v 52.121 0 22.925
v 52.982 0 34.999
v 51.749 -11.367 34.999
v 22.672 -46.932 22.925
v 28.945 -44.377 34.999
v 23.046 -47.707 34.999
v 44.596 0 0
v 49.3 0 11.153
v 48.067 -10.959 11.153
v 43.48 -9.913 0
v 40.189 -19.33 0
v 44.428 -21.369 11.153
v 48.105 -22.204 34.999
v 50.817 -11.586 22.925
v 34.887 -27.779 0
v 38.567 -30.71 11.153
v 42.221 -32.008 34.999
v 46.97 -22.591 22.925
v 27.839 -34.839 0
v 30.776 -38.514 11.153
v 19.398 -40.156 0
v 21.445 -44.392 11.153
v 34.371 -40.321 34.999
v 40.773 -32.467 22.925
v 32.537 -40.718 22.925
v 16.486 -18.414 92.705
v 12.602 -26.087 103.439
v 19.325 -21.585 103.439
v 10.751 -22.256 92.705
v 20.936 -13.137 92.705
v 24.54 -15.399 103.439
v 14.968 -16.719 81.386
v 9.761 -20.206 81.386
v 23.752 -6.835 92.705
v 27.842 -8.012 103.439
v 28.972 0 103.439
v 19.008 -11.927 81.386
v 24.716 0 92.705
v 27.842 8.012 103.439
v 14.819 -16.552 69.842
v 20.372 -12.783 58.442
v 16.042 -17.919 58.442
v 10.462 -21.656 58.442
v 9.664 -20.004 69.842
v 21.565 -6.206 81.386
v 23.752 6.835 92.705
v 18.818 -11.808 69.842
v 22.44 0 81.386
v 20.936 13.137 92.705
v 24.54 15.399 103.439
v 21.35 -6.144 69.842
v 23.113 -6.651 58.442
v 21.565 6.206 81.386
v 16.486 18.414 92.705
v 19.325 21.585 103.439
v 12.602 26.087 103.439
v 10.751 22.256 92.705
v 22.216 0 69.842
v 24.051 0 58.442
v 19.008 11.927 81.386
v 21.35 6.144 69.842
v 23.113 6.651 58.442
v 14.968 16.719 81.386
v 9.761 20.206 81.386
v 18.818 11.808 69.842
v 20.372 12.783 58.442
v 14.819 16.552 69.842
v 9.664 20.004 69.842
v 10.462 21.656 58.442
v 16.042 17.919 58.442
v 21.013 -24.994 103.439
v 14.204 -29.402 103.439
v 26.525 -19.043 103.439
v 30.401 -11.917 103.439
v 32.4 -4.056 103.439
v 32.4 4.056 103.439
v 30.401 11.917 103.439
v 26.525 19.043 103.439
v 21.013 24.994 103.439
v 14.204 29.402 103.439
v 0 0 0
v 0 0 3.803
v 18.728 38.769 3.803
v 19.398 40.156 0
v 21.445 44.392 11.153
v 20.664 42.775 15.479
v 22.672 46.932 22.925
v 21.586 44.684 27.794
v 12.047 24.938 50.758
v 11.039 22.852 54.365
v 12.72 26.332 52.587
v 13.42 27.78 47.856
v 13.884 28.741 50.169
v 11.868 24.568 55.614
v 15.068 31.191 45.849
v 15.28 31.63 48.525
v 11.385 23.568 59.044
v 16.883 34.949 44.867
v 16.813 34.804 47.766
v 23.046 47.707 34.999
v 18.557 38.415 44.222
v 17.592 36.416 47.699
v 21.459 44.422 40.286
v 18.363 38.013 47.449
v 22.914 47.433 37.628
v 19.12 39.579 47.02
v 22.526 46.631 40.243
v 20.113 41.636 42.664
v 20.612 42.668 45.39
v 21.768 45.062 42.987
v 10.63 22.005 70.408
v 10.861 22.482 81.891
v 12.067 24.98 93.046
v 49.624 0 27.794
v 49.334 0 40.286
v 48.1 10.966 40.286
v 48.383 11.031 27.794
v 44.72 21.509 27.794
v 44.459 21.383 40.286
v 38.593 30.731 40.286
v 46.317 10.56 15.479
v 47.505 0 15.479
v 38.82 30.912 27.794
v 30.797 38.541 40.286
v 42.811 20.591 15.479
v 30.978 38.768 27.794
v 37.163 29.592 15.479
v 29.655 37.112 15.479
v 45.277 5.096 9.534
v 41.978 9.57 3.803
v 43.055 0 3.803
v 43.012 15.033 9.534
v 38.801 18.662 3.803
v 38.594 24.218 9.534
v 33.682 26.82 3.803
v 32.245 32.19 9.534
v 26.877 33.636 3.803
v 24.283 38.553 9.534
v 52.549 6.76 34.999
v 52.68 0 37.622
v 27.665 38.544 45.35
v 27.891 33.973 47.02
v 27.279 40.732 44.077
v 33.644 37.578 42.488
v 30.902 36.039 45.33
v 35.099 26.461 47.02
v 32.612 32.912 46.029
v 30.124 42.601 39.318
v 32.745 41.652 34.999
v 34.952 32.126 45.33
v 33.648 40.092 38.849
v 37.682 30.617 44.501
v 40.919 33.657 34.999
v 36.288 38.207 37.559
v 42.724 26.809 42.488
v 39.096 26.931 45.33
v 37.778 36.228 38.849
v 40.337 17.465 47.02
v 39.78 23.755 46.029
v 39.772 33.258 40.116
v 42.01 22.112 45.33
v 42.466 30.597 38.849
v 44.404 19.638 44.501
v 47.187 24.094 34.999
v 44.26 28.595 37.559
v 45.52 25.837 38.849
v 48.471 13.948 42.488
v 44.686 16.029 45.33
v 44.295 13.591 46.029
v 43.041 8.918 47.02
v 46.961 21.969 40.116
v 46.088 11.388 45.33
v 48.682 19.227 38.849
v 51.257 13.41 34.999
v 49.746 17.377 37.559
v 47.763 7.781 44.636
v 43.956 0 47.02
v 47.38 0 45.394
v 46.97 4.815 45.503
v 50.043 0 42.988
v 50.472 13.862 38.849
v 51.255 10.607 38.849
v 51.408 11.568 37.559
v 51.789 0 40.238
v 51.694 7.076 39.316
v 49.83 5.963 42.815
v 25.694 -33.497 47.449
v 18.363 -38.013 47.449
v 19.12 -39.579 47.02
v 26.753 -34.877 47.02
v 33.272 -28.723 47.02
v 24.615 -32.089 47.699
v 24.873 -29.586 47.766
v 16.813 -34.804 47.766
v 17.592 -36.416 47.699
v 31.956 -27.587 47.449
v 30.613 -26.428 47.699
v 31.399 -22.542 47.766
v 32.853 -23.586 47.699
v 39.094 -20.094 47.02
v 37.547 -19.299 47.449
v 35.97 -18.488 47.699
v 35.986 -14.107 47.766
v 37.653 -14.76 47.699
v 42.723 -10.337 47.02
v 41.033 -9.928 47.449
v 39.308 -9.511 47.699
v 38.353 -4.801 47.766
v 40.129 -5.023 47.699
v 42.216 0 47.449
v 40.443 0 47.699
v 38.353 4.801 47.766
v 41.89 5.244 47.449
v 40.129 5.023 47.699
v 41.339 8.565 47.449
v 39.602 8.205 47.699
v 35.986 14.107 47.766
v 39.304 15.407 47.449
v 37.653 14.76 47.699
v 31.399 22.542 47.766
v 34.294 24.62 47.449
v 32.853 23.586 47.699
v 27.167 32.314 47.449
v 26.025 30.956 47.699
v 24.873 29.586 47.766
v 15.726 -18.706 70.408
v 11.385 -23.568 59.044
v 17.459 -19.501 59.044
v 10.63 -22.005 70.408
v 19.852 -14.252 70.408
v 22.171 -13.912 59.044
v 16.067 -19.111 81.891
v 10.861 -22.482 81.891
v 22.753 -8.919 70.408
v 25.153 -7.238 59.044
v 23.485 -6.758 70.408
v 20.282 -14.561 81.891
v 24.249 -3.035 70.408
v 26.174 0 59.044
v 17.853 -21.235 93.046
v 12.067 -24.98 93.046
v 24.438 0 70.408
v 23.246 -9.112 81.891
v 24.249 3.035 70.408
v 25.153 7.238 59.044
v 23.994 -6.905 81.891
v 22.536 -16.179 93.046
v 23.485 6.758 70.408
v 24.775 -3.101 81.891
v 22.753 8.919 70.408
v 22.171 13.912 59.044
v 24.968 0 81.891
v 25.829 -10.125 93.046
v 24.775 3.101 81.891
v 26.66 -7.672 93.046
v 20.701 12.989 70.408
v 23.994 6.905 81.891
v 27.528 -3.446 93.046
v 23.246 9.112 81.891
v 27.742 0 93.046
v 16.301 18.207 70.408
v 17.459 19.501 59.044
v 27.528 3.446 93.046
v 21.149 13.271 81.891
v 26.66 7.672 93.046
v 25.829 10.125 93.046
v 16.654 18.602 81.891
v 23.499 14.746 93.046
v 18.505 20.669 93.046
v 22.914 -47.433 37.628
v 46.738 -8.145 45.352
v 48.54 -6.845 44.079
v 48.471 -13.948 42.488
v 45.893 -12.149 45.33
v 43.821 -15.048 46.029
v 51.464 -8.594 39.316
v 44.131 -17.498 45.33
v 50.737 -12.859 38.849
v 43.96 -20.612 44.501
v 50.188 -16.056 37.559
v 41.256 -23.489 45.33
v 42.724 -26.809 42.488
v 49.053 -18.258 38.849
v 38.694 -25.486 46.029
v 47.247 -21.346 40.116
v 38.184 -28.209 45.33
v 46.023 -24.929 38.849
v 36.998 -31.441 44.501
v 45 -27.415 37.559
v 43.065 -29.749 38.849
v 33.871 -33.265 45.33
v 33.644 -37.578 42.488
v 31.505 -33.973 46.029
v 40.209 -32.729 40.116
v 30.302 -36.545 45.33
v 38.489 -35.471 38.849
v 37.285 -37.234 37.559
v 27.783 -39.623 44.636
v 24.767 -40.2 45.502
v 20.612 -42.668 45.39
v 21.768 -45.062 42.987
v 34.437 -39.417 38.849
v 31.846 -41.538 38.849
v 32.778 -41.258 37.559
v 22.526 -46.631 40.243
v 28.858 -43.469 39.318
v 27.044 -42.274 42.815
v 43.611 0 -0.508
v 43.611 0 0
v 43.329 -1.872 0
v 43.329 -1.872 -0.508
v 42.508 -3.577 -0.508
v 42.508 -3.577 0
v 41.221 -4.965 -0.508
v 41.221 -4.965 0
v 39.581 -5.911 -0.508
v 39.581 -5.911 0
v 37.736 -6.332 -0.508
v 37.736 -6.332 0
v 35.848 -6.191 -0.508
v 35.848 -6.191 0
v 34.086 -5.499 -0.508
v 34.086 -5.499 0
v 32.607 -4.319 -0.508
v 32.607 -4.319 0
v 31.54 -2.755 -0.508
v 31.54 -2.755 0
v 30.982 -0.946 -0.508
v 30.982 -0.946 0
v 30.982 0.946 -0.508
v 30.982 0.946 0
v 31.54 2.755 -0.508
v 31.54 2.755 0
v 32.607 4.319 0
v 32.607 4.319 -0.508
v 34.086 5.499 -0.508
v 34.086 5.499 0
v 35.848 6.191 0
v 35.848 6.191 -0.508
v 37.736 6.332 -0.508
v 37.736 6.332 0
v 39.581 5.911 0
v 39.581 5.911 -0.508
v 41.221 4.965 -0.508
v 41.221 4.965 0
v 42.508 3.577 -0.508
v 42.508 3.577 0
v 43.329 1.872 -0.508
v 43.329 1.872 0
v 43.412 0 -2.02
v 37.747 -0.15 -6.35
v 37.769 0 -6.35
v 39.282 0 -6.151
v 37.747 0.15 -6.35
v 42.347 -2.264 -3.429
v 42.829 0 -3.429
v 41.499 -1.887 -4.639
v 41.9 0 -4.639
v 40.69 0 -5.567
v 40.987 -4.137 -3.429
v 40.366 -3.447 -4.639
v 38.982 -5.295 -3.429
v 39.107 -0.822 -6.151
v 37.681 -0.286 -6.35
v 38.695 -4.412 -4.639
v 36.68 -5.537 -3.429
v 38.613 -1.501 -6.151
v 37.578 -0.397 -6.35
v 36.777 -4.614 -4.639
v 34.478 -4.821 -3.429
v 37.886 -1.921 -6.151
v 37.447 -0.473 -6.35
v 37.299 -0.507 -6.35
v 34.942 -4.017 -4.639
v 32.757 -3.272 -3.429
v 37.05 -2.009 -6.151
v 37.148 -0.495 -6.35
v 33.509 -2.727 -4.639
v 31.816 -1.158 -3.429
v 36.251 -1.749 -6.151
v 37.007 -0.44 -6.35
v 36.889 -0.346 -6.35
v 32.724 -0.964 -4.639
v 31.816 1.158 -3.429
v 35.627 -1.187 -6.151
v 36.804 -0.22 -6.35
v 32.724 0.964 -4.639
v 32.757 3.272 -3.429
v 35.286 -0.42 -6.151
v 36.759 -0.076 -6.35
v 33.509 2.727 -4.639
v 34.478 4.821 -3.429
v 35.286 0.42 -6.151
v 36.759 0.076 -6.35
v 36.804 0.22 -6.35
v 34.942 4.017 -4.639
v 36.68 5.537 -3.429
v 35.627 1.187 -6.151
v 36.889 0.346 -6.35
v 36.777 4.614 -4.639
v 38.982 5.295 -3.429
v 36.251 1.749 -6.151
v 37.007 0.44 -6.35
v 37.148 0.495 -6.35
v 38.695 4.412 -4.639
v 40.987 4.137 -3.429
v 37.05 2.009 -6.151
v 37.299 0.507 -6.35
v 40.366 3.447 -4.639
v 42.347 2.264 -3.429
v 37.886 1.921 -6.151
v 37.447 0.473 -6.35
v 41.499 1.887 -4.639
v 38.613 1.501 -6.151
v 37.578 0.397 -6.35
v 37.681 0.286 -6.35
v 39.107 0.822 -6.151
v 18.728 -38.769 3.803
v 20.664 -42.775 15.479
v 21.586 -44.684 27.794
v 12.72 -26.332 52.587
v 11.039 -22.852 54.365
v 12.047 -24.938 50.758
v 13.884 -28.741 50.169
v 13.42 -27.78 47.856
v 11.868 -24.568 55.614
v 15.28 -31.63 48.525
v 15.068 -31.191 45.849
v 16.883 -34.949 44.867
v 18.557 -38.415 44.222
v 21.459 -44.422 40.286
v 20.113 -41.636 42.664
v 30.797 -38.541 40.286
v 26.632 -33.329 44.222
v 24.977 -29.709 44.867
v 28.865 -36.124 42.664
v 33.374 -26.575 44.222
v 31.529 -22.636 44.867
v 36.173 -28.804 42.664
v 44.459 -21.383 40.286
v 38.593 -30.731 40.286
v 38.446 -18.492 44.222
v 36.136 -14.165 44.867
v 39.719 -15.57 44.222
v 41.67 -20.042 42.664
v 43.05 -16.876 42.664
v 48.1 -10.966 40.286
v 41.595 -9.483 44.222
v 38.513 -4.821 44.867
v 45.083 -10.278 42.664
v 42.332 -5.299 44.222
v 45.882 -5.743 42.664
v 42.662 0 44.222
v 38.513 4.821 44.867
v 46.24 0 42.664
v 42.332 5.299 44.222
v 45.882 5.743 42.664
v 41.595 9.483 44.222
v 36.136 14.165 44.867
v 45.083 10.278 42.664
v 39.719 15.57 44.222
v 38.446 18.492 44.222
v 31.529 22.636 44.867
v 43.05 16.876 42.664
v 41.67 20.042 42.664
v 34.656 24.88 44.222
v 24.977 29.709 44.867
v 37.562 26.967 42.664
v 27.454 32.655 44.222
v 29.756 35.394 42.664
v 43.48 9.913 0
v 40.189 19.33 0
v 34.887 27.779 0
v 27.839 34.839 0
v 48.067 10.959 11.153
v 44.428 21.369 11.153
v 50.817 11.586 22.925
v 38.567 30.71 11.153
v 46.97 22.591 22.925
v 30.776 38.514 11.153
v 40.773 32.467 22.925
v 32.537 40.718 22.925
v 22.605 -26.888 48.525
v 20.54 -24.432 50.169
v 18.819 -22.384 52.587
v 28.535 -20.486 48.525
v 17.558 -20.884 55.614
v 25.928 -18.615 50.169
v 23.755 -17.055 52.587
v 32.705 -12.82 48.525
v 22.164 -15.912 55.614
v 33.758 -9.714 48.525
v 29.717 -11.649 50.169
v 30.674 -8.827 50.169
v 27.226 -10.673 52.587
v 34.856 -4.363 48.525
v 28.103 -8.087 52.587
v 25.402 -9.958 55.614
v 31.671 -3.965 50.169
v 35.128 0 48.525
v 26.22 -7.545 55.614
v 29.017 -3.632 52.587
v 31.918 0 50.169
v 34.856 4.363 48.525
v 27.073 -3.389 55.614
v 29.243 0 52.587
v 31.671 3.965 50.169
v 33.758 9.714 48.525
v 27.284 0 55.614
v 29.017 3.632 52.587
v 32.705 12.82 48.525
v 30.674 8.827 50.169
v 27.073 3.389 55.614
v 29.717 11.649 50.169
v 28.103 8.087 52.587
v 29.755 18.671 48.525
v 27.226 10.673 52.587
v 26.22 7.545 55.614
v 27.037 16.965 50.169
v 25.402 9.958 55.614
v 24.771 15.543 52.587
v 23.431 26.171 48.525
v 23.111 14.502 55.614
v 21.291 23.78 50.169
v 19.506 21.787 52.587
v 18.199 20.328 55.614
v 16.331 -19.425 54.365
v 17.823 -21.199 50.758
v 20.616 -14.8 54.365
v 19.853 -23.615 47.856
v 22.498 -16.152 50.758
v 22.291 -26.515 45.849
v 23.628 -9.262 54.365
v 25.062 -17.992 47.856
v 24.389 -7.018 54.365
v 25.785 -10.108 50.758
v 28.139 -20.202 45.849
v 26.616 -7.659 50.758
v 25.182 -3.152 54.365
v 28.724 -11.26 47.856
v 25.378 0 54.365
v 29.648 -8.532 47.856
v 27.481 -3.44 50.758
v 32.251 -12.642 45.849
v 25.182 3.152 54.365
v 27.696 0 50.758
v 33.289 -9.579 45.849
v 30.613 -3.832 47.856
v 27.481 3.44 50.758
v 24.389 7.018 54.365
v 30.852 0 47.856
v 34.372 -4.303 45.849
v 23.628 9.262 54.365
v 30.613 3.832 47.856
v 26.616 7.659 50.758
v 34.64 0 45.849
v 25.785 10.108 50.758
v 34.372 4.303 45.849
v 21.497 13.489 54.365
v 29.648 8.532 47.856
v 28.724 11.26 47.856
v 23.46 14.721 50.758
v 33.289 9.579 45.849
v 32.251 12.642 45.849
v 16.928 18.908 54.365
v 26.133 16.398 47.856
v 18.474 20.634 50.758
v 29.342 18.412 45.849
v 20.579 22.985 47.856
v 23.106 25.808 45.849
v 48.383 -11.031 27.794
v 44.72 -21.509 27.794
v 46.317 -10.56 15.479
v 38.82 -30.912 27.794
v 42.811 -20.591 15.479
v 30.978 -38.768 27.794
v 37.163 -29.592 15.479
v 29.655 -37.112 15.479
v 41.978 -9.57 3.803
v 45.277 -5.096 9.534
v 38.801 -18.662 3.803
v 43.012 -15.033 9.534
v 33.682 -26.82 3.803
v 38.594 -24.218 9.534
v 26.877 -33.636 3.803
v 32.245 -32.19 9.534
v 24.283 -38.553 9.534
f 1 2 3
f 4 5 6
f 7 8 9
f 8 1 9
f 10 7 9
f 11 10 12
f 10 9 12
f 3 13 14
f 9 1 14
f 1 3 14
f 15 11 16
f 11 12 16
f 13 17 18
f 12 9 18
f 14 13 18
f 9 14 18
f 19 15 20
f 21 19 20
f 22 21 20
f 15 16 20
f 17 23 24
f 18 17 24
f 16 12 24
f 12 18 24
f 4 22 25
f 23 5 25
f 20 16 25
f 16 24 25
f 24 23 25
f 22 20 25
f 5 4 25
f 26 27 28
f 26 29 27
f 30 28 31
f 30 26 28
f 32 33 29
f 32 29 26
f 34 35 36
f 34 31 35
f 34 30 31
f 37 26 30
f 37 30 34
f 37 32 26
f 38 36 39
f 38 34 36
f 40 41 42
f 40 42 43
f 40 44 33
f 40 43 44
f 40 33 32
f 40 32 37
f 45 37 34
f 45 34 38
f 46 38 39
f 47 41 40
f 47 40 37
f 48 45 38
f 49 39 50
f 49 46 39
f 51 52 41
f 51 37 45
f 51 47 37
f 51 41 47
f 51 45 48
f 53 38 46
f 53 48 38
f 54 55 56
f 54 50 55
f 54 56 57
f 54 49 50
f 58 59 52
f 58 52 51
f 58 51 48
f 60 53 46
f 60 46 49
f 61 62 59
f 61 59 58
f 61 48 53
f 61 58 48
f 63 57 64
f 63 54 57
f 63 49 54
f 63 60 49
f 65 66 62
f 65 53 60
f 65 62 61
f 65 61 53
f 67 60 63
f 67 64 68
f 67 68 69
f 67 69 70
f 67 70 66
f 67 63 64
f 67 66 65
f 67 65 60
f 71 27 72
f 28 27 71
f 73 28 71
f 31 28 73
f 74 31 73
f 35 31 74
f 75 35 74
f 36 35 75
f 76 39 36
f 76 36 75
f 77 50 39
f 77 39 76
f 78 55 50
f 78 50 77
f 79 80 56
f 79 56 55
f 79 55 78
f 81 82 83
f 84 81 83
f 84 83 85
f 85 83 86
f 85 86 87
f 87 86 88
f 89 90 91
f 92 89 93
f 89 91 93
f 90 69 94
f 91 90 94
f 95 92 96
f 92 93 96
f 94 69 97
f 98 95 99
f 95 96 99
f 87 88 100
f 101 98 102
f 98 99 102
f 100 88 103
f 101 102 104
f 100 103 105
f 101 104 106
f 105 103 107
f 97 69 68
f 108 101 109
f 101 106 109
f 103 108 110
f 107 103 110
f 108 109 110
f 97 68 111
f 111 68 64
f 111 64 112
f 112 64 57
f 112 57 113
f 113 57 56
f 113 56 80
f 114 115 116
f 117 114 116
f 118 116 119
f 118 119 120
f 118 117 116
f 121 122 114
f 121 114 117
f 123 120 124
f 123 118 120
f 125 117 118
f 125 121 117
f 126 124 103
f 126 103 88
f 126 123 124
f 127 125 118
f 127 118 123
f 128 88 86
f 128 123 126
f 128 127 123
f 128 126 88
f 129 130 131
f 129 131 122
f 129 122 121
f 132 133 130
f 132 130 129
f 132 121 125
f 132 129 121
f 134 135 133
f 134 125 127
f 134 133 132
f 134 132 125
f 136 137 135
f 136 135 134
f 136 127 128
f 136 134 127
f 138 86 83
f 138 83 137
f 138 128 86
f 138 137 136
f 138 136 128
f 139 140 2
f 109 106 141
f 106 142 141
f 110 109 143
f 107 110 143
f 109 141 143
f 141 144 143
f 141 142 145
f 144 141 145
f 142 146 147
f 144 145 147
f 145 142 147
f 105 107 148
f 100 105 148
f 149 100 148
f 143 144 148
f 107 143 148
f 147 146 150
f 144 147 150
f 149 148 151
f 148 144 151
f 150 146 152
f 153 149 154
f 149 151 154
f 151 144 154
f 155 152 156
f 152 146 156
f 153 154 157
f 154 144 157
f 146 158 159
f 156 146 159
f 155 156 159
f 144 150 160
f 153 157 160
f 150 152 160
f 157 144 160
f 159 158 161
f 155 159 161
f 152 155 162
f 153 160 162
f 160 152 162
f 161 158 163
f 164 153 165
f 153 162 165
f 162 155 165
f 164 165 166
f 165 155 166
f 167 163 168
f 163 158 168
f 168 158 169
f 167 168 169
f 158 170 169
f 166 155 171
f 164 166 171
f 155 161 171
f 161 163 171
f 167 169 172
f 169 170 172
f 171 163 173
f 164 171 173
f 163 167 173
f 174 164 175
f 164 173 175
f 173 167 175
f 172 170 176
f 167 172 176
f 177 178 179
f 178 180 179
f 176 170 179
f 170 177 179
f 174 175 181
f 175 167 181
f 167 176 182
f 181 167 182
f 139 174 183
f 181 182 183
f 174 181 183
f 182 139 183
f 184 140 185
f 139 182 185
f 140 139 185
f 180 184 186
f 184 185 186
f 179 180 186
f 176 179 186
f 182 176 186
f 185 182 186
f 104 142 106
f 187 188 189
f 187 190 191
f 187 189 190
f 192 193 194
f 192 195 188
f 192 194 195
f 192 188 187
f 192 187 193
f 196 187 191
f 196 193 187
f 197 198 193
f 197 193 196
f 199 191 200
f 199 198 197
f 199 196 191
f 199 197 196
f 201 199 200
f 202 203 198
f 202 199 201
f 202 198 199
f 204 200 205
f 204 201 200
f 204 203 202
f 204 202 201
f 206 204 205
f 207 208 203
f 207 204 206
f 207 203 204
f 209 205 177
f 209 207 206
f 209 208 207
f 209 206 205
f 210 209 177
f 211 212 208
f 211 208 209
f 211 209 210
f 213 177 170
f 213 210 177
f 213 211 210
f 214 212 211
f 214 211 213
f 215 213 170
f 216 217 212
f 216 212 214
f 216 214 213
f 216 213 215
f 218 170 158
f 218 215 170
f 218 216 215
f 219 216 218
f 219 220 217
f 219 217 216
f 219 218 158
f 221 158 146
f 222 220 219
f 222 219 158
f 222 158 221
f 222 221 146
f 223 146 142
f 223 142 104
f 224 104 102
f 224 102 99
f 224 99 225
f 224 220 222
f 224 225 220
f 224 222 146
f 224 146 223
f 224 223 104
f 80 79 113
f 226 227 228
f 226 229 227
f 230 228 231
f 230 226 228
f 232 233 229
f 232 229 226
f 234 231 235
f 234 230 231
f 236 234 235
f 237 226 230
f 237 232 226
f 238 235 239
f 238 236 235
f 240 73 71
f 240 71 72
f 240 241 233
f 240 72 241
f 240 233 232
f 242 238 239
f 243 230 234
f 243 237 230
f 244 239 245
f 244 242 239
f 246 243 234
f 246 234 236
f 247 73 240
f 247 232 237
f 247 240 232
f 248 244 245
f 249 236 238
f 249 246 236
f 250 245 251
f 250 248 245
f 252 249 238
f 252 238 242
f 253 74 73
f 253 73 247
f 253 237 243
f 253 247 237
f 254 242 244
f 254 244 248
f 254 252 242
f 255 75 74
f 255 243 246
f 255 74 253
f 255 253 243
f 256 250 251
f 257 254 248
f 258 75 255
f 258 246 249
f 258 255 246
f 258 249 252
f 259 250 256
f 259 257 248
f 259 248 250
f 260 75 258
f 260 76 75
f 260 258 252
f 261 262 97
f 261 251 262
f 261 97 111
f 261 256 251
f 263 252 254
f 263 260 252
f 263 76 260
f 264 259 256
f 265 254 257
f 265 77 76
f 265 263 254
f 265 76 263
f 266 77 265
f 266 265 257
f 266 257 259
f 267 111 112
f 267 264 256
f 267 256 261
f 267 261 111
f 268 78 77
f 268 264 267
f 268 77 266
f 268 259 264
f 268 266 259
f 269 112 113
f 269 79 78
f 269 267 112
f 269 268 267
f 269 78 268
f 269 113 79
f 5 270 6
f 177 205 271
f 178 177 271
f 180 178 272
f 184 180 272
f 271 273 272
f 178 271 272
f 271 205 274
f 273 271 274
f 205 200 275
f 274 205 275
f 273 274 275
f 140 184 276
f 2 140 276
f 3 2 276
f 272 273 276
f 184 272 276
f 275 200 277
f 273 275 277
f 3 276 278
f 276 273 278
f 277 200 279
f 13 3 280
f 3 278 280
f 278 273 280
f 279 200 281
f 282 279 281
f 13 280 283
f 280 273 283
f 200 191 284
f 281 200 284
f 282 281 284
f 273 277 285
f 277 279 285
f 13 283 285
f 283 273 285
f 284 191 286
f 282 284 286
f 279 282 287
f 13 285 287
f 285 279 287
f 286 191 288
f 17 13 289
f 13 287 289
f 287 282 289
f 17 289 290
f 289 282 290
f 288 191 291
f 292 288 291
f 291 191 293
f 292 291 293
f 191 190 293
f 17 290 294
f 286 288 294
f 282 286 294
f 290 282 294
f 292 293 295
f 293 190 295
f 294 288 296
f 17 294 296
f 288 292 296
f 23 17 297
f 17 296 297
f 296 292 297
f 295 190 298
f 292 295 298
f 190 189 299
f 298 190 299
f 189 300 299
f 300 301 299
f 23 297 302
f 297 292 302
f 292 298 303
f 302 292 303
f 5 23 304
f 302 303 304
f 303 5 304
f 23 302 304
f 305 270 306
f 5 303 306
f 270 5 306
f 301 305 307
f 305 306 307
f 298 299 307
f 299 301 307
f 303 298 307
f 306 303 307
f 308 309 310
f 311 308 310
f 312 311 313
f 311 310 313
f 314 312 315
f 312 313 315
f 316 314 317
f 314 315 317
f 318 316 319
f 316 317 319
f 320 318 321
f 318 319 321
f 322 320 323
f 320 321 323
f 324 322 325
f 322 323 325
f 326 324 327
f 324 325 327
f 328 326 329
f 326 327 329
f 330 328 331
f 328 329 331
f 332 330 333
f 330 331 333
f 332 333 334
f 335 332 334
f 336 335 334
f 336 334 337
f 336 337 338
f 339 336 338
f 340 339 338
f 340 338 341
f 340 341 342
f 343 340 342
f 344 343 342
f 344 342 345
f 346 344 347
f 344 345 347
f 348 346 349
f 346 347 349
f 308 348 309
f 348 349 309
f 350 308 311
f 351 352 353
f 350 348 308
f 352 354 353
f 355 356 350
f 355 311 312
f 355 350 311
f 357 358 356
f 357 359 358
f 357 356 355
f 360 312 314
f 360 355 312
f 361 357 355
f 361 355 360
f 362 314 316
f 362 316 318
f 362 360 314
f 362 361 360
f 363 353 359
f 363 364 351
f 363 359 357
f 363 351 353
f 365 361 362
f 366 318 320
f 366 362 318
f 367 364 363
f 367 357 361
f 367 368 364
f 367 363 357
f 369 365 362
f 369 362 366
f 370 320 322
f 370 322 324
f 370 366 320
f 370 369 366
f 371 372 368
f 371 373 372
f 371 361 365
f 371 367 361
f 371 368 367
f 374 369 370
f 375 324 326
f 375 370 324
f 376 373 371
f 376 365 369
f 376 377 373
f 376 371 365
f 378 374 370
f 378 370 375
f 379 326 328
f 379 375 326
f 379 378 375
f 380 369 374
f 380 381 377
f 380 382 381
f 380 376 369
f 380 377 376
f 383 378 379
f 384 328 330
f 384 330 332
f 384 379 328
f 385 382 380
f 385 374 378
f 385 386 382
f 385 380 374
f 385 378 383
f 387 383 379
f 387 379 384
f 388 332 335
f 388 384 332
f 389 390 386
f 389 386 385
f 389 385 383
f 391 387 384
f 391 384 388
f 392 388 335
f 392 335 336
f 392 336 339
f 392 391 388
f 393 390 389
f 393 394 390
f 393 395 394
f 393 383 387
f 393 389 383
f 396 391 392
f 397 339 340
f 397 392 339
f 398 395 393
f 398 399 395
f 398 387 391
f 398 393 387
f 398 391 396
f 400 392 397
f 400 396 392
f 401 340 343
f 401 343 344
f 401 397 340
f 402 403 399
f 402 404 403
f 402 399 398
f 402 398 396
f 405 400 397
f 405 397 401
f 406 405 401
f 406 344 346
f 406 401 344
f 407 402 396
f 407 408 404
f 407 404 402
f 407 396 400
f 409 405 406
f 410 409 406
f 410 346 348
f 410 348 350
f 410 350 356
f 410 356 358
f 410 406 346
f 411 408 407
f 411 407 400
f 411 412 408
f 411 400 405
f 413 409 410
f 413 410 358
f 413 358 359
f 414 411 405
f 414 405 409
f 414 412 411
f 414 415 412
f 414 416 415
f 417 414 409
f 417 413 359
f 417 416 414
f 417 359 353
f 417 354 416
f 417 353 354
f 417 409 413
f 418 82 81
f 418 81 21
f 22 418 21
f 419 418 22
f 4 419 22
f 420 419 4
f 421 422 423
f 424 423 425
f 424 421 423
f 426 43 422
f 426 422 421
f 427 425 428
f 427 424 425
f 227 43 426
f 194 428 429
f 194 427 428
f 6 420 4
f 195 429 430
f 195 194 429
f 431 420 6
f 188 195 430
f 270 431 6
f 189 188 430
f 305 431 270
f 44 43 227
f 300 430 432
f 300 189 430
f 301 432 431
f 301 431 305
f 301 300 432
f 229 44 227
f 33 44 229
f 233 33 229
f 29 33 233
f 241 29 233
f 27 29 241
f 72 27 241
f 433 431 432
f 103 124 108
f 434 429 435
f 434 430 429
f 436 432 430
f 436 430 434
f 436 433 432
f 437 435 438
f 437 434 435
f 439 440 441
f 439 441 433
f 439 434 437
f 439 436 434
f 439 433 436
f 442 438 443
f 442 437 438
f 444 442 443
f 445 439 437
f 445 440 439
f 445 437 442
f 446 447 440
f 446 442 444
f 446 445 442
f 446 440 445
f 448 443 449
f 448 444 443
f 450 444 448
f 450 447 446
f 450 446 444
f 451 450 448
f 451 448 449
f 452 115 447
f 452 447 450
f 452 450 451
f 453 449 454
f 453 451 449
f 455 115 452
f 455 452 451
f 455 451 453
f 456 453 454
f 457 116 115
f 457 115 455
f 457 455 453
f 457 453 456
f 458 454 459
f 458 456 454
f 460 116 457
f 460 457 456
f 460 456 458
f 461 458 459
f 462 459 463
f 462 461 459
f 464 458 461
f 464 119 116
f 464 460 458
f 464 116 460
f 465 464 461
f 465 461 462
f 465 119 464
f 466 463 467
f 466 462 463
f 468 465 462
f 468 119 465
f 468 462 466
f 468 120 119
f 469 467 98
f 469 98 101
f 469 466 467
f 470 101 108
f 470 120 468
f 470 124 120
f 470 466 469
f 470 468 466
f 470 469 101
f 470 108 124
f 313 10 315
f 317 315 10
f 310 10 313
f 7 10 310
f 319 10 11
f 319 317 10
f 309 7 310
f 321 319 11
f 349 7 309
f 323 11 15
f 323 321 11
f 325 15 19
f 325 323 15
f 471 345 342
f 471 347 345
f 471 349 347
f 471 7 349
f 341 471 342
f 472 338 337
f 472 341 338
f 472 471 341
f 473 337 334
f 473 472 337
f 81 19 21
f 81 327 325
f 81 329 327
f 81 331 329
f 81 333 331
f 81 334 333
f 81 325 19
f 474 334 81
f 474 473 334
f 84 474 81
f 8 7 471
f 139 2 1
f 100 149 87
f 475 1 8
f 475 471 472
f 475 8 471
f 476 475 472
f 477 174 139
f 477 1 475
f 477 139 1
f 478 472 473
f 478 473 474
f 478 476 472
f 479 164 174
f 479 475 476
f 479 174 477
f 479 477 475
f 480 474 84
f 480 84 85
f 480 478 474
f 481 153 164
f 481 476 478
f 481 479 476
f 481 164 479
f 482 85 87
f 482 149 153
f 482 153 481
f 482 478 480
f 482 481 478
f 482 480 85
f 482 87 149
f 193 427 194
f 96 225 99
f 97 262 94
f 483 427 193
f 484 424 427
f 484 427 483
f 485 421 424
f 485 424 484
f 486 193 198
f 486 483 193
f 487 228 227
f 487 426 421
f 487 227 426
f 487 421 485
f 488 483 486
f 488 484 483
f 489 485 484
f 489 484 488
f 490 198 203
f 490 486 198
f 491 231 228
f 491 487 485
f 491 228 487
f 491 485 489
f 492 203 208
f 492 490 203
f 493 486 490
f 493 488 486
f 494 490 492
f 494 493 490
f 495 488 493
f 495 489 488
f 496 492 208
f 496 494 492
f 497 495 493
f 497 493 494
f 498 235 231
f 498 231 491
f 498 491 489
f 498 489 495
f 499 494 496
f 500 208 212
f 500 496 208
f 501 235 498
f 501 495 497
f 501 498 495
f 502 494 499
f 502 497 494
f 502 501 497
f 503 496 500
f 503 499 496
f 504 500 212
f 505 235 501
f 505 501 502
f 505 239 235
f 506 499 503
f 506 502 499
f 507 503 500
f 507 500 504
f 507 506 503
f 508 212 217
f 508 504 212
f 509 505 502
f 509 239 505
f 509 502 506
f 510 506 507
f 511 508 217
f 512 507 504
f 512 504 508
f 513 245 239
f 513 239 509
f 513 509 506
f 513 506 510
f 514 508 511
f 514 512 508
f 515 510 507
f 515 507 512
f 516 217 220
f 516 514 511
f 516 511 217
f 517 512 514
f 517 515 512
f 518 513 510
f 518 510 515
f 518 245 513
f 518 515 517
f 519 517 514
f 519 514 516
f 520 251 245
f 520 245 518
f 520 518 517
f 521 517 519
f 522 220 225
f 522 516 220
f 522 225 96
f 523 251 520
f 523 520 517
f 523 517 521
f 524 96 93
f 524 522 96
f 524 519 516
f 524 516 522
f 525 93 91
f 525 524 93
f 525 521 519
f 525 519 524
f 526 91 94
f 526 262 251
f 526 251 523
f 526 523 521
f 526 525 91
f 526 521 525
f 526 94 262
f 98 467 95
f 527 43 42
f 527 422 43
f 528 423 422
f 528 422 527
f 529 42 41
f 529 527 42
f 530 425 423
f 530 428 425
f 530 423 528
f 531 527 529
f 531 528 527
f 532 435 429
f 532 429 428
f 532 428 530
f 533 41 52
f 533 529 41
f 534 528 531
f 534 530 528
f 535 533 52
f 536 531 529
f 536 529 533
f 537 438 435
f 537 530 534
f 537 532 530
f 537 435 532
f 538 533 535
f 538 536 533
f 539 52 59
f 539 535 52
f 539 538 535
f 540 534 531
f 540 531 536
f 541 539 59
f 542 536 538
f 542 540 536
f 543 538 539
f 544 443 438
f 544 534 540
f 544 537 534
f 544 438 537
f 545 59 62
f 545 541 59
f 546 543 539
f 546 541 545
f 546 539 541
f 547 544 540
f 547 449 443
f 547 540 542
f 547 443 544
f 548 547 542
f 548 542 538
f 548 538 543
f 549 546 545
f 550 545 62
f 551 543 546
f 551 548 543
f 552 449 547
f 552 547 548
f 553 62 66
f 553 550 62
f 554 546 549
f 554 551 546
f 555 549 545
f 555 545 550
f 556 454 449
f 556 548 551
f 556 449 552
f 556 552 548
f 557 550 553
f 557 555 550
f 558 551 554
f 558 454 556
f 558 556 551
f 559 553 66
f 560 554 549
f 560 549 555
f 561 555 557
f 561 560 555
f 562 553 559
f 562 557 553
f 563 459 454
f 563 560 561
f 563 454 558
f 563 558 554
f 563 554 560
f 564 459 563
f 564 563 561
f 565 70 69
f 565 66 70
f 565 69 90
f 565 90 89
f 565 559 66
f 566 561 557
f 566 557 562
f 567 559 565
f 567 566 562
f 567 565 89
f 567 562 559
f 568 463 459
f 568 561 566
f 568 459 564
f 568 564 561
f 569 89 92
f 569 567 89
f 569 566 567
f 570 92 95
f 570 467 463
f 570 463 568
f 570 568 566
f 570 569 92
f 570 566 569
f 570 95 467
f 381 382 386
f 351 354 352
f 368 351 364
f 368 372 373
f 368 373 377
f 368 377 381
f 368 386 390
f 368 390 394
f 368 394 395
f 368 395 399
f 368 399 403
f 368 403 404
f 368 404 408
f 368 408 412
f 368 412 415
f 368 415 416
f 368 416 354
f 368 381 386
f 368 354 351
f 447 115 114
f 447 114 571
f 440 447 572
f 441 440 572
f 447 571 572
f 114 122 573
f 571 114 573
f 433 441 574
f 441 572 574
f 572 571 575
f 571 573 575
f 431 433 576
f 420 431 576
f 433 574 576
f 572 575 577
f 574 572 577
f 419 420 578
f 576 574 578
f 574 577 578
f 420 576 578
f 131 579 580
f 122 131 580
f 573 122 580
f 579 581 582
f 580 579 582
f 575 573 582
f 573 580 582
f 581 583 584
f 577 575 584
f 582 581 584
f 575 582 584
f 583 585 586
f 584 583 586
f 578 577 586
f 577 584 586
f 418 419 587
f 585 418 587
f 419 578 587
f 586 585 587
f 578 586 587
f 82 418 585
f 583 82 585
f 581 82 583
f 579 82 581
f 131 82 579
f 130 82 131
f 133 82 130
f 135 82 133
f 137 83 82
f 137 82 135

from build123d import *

# Parameters (mm, degrees)
F1_ANGLE = 128.431819
F2_R     = 12.7
F3_R     = 6.35
F4_DEPTH = 6.35
F5_R     = 5.842


with BuildPart() as f1:
    # F0 (on Front) → F1 (revolve, symmetric)
    with BuildSketch(Plane.XZ) as f1_sk:
        with BuildLine():
            Line((0, 3.803344), (0, 0))
            Line((0, 0), (44.595737, 0))
            ThreePointArc((44.595737, 0), (51.598835, 19.948952), (52.667361, 41.064404))
            ThreePointArc((52.667361, 41.064404), (46.444255, 46.055297), (38.652573, 47.765777))
            ThreePointArc((38.652573, 47.765777), (30.501858, 51.290272), (26.174091, 59.04441))
            ThreePointArc((26.174091, 59.04441), (24.968043, 81.890542), (32.653302, 103.439026))
            Line((32.653302, 103.439026), (28.97153, 103.439026))
            ThreePointArc((28.97153, 103.439026), (22.44019, 81.38567), (24.050664, 58.44193))
            ThreePointArc((24.050664, 58.44193), (29.180601, 49.206171), (38.813263, 44.867128))
            ThreePointArc((38.813263, 44.867128), (44.498632, 43.552613), (49.333733, 40.285632))
            ThreePointArc((49.333733, 40.285632), (48.862981, 21.585272), (43.055389, 3.803344))
            Line((43.055389, 3.803344), (0, 3.803344))
        make_face()
    revolve(axis=Axis((0, 0, 1.901672), (0, 0, -1)), revolution_arc=F1_ANGLE / 2)
    revolve(f1_sk.sketch, axis=Axis((0, 0, 1.901672), (0, 0, 1)), revolution_arc=F1_ANGLE / 2)

    # F2
    f2_edges = [f1.edges().sort_by_distance(p)[0] for p in [
        (44.61179, -27.993555, 41.064404),
    ]]
    fillet(f2_edges, radius=F2_R)

    # F3 (on face) → F4 (join)
    with BuildSketch(Plane(origin=(0, 0, 0), x_dir=(1, 0, 0), z_dir=(0, 0, -1))):
        with Locations((37.261488, 0)):
            Circle(F3_R)
    extrude(amount=F4_DEPTH)

    # F5
    f5_edges = [f1.edges().sort_by_distance(p)[0] for p in [
        (30.911488, 0, -6.35),
    ]]
    fillet(f5_edges, radius=F5_R)


solid = f1.part
